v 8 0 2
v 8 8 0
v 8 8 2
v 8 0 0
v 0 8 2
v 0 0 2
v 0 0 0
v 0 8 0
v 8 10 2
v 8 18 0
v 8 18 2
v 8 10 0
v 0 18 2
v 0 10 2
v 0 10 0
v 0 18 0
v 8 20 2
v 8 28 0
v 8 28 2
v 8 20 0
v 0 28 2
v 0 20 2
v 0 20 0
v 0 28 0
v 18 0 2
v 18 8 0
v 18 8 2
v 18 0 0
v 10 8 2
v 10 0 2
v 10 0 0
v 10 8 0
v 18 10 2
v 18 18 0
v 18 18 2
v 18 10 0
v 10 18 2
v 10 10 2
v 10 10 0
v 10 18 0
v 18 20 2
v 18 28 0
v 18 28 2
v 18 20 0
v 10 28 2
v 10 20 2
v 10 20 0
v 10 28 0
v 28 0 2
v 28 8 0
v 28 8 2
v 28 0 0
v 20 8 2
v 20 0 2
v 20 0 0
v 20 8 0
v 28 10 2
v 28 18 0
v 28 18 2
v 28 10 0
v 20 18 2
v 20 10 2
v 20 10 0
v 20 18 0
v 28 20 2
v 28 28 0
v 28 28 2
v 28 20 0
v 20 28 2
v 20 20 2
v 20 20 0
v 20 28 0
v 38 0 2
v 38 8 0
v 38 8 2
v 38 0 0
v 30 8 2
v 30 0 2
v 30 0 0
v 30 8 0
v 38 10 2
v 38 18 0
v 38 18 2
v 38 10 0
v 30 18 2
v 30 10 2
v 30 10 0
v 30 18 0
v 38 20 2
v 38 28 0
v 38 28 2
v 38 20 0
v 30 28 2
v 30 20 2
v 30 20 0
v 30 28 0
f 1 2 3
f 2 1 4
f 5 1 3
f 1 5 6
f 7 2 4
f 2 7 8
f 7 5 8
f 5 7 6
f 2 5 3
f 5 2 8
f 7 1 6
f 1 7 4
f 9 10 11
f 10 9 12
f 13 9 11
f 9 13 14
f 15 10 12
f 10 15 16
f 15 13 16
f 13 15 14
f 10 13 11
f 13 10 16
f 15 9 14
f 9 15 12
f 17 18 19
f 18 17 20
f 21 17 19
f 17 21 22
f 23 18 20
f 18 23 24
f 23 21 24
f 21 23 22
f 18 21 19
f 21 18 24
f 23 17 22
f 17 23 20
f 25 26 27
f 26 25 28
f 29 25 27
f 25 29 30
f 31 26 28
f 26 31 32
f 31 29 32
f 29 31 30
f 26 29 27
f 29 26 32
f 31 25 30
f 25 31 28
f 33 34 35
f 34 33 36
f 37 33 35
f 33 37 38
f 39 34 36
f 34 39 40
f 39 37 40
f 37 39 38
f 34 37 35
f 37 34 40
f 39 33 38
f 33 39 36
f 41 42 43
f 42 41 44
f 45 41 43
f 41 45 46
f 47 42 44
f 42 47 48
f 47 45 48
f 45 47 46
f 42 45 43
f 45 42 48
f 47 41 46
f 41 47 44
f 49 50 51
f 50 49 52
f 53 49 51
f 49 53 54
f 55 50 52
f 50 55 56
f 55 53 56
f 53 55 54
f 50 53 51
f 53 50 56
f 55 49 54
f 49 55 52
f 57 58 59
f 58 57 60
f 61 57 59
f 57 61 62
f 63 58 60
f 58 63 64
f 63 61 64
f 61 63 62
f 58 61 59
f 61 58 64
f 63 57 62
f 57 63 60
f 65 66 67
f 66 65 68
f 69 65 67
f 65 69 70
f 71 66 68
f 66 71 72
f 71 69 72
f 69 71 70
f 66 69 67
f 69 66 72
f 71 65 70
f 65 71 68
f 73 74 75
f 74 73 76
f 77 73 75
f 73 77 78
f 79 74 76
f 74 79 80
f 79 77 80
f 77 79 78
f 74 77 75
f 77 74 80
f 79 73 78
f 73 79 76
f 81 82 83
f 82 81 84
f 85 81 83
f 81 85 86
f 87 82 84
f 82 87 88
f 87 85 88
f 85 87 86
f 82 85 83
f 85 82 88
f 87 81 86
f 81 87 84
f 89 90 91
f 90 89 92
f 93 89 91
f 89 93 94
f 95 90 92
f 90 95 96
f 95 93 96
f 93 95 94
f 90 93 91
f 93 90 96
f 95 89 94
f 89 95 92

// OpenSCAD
// Build-time probe ONLY — not a catalog generator, never served to users.
// Deliberately shaped like this addon's real workload (a grid), and deliberately exercises the
// Customizer: three top-level LITERAL assignments with description comments, all before the first
// `{` character (OpenSCAD stops collecting parameters at that brace).
/* [Probe] */
// number of columns
cols = 4;
// number of rows
rows = 3;
// wall thickness in mm
wall = 2;

module plate() {
    for (i = [0:cols - 1], j = [0:rows - 1])
        translate([i * 10, j * 10, 0]) cube([8, 8, wall]);
}

plate();
